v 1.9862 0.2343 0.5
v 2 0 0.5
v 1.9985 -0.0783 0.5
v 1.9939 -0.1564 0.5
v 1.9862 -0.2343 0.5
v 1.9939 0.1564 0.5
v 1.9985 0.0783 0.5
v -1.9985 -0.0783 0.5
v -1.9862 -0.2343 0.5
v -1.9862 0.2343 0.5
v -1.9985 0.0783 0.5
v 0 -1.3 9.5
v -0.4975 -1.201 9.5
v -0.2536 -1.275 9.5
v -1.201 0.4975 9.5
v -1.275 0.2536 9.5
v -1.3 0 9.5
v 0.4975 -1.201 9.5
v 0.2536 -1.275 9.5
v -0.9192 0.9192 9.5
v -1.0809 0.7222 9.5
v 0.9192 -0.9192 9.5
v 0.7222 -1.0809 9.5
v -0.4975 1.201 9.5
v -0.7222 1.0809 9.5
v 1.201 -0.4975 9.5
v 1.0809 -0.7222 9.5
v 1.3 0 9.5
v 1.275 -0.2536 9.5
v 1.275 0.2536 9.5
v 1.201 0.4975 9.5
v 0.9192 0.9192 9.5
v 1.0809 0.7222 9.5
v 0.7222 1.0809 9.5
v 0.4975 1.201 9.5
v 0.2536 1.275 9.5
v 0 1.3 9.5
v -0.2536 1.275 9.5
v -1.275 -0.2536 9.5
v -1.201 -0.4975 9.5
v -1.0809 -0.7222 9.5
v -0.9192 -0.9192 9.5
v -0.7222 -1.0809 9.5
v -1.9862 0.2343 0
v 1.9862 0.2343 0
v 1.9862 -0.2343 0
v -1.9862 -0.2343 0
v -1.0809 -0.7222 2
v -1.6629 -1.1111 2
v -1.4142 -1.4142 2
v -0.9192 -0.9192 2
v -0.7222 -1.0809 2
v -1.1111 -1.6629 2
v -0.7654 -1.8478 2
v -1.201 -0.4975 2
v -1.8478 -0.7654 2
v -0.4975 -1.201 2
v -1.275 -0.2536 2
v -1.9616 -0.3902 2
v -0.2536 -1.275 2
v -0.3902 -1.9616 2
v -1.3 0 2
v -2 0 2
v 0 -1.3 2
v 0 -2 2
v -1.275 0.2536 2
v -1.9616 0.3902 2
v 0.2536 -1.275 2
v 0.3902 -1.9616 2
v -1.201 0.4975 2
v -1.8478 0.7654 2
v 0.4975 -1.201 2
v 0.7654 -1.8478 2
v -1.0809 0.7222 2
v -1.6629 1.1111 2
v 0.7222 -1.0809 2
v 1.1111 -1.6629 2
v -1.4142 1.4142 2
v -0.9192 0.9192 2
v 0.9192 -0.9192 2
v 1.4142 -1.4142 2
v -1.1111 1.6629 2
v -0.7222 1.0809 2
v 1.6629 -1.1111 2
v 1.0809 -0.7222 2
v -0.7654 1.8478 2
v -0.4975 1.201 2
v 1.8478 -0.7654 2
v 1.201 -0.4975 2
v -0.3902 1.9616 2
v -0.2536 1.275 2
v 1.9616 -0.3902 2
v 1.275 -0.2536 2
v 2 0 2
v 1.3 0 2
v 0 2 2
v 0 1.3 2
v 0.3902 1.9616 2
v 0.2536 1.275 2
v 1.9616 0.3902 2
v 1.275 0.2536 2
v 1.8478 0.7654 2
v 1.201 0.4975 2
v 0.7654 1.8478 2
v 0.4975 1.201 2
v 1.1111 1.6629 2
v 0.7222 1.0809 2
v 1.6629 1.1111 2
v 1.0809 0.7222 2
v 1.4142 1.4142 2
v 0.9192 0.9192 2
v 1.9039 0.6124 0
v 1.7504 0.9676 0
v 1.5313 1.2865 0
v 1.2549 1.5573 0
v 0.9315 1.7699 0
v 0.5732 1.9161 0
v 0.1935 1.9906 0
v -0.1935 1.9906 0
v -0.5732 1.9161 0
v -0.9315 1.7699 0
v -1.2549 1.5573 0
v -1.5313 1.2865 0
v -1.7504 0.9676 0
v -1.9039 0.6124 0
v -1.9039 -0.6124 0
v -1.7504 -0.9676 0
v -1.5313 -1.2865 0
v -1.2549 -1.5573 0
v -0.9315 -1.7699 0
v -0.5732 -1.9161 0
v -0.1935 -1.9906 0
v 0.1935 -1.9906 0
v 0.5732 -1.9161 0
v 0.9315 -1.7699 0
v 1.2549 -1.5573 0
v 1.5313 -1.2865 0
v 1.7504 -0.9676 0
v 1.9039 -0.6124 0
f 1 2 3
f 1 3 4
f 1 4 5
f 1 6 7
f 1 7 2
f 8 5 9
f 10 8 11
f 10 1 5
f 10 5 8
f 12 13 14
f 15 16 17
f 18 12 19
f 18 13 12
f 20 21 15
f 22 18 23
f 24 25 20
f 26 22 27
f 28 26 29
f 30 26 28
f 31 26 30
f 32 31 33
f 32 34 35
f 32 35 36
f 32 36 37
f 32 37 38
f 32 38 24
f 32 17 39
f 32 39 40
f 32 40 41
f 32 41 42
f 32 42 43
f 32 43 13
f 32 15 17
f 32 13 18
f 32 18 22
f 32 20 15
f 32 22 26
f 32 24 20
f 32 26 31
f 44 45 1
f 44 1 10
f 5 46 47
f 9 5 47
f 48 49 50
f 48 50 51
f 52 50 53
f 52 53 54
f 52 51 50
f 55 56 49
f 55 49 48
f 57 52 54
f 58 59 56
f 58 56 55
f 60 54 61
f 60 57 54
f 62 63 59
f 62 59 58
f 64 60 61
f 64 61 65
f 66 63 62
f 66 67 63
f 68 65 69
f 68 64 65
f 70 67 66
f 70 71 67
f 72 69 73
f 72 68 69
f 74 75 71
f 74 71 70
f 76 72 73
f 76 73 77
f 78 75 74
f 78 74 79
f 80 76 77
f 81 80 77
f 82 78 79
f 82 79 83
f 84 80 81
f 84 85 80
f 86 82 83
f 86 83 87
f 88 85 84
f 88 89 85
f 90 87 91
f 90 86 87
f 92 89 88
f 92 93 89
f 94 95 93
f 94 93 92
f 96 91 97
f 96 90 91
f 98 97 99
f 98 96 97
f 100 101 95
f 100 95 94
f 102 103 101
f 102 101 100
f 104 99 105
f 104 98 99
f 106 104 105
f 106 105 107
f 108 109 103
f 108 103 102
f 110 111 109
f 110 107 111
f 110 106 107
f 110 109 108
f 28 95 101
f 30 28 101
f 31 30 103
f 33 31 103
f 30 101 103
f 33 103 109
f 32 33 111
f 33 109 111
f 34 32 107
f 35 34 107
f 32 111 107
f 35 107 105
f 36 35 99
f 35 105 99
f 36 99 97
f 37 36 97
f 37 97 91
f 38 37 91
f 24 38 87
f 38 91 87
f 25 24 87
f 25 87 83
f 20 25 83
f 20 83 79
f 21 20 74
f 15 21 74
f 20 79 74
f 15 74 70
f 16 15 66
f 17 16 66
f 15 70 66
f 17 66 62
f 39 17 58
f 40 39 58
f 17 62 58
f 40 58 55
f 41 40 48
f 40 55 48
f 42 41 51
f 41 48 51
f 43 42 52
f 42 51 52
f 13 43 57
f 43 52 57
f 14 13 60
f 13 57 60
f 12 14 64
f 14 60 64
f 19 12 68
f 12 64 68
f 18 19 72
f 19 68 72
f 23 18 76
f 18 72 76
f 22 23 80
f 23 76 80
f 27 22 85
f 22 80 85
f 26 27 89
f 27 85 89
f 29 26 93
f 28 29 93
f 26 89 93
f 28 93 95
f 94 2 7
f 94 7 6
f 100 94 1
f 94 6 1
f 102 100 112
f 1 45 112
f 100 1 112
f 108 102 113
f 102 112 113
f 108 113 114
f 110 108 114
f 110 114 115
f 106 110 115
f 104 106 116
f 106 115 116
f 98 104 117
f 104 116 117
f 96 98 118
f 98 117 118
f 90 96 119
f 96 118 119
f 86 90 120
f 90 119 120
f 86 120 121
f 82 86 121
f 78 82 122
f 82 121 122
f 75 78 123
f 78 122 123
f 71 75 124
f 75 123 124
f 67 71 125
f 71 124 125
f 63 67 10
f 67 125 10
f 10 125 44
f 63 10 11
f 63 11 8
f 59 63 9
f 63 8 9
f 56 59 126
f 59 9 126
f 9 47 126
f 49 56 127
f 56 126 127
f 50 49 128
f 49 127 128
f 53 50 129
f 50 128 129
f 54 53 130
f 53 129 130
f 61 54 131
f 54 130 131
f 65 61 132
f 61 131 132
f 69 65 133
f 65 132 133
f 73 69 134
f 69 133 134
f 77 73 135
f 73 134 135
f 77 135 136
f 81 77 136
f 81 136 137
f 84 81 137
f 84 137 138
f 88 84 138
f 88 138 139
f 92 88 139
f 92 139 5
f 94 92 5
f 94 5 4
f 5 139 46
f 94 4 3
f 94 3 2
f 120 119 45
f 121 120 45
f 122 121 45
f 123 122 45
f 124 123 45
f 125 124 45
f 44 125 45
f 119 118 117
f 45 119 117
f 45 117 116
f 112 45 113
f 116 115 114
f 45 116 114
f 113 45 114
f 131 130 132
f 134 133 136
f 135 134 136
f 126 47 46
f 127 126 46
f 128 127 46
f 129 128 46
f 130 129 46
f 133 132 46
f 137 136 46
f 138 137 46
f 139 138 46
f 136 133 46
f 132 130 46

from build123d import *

# Parameters (mm, degrees)
ESQUISSE1_R             = 2
BOSS_EXTRU_1_DEPTH      = 2
ESQUISSE2_R             = 1.3
BOSS_EXTRU_2_DEPTH      = 7.5
ESQUISSE3_W             = 5.055349602
ESQUISSE3_H             = 0.46857679
ENL_V_MAT_EXTRU_1_DEPTH = 0.5


with BuildPart() as part:
    # Esquisse1 → Boss.-Extru.1 (new body)
    with BuildSketch(Plane.XY):
        Circle(ESQUISSE1_R)
    extrude(amount=BOSS_EXTRU_1_DEPTH)

    # Esquisse2 → Boss.-Extru.2 (add)
    with BuildSketch(Plane.XY.offset(2)):
        Circle(ESQUISSE2_R)
    extrude(amount=BOSS_EXTRU_2_DEPTH)

    # Esquisse3 → Enlèv. mat.-Extru.1 (cut)
    with BuildSketch(Plane(origin=(0, 0, 0), x_dir=(-1, 0, 0), z_dir=(0, 0, -1))):
        Rectangle(ESQUISSE3_W, ESQUISSE3_H)
    extrude(amount=-ENL_V_MAT_EXTRU_1_DEPTH, mode=Mode.SUBTRACT)


solid = part.part
